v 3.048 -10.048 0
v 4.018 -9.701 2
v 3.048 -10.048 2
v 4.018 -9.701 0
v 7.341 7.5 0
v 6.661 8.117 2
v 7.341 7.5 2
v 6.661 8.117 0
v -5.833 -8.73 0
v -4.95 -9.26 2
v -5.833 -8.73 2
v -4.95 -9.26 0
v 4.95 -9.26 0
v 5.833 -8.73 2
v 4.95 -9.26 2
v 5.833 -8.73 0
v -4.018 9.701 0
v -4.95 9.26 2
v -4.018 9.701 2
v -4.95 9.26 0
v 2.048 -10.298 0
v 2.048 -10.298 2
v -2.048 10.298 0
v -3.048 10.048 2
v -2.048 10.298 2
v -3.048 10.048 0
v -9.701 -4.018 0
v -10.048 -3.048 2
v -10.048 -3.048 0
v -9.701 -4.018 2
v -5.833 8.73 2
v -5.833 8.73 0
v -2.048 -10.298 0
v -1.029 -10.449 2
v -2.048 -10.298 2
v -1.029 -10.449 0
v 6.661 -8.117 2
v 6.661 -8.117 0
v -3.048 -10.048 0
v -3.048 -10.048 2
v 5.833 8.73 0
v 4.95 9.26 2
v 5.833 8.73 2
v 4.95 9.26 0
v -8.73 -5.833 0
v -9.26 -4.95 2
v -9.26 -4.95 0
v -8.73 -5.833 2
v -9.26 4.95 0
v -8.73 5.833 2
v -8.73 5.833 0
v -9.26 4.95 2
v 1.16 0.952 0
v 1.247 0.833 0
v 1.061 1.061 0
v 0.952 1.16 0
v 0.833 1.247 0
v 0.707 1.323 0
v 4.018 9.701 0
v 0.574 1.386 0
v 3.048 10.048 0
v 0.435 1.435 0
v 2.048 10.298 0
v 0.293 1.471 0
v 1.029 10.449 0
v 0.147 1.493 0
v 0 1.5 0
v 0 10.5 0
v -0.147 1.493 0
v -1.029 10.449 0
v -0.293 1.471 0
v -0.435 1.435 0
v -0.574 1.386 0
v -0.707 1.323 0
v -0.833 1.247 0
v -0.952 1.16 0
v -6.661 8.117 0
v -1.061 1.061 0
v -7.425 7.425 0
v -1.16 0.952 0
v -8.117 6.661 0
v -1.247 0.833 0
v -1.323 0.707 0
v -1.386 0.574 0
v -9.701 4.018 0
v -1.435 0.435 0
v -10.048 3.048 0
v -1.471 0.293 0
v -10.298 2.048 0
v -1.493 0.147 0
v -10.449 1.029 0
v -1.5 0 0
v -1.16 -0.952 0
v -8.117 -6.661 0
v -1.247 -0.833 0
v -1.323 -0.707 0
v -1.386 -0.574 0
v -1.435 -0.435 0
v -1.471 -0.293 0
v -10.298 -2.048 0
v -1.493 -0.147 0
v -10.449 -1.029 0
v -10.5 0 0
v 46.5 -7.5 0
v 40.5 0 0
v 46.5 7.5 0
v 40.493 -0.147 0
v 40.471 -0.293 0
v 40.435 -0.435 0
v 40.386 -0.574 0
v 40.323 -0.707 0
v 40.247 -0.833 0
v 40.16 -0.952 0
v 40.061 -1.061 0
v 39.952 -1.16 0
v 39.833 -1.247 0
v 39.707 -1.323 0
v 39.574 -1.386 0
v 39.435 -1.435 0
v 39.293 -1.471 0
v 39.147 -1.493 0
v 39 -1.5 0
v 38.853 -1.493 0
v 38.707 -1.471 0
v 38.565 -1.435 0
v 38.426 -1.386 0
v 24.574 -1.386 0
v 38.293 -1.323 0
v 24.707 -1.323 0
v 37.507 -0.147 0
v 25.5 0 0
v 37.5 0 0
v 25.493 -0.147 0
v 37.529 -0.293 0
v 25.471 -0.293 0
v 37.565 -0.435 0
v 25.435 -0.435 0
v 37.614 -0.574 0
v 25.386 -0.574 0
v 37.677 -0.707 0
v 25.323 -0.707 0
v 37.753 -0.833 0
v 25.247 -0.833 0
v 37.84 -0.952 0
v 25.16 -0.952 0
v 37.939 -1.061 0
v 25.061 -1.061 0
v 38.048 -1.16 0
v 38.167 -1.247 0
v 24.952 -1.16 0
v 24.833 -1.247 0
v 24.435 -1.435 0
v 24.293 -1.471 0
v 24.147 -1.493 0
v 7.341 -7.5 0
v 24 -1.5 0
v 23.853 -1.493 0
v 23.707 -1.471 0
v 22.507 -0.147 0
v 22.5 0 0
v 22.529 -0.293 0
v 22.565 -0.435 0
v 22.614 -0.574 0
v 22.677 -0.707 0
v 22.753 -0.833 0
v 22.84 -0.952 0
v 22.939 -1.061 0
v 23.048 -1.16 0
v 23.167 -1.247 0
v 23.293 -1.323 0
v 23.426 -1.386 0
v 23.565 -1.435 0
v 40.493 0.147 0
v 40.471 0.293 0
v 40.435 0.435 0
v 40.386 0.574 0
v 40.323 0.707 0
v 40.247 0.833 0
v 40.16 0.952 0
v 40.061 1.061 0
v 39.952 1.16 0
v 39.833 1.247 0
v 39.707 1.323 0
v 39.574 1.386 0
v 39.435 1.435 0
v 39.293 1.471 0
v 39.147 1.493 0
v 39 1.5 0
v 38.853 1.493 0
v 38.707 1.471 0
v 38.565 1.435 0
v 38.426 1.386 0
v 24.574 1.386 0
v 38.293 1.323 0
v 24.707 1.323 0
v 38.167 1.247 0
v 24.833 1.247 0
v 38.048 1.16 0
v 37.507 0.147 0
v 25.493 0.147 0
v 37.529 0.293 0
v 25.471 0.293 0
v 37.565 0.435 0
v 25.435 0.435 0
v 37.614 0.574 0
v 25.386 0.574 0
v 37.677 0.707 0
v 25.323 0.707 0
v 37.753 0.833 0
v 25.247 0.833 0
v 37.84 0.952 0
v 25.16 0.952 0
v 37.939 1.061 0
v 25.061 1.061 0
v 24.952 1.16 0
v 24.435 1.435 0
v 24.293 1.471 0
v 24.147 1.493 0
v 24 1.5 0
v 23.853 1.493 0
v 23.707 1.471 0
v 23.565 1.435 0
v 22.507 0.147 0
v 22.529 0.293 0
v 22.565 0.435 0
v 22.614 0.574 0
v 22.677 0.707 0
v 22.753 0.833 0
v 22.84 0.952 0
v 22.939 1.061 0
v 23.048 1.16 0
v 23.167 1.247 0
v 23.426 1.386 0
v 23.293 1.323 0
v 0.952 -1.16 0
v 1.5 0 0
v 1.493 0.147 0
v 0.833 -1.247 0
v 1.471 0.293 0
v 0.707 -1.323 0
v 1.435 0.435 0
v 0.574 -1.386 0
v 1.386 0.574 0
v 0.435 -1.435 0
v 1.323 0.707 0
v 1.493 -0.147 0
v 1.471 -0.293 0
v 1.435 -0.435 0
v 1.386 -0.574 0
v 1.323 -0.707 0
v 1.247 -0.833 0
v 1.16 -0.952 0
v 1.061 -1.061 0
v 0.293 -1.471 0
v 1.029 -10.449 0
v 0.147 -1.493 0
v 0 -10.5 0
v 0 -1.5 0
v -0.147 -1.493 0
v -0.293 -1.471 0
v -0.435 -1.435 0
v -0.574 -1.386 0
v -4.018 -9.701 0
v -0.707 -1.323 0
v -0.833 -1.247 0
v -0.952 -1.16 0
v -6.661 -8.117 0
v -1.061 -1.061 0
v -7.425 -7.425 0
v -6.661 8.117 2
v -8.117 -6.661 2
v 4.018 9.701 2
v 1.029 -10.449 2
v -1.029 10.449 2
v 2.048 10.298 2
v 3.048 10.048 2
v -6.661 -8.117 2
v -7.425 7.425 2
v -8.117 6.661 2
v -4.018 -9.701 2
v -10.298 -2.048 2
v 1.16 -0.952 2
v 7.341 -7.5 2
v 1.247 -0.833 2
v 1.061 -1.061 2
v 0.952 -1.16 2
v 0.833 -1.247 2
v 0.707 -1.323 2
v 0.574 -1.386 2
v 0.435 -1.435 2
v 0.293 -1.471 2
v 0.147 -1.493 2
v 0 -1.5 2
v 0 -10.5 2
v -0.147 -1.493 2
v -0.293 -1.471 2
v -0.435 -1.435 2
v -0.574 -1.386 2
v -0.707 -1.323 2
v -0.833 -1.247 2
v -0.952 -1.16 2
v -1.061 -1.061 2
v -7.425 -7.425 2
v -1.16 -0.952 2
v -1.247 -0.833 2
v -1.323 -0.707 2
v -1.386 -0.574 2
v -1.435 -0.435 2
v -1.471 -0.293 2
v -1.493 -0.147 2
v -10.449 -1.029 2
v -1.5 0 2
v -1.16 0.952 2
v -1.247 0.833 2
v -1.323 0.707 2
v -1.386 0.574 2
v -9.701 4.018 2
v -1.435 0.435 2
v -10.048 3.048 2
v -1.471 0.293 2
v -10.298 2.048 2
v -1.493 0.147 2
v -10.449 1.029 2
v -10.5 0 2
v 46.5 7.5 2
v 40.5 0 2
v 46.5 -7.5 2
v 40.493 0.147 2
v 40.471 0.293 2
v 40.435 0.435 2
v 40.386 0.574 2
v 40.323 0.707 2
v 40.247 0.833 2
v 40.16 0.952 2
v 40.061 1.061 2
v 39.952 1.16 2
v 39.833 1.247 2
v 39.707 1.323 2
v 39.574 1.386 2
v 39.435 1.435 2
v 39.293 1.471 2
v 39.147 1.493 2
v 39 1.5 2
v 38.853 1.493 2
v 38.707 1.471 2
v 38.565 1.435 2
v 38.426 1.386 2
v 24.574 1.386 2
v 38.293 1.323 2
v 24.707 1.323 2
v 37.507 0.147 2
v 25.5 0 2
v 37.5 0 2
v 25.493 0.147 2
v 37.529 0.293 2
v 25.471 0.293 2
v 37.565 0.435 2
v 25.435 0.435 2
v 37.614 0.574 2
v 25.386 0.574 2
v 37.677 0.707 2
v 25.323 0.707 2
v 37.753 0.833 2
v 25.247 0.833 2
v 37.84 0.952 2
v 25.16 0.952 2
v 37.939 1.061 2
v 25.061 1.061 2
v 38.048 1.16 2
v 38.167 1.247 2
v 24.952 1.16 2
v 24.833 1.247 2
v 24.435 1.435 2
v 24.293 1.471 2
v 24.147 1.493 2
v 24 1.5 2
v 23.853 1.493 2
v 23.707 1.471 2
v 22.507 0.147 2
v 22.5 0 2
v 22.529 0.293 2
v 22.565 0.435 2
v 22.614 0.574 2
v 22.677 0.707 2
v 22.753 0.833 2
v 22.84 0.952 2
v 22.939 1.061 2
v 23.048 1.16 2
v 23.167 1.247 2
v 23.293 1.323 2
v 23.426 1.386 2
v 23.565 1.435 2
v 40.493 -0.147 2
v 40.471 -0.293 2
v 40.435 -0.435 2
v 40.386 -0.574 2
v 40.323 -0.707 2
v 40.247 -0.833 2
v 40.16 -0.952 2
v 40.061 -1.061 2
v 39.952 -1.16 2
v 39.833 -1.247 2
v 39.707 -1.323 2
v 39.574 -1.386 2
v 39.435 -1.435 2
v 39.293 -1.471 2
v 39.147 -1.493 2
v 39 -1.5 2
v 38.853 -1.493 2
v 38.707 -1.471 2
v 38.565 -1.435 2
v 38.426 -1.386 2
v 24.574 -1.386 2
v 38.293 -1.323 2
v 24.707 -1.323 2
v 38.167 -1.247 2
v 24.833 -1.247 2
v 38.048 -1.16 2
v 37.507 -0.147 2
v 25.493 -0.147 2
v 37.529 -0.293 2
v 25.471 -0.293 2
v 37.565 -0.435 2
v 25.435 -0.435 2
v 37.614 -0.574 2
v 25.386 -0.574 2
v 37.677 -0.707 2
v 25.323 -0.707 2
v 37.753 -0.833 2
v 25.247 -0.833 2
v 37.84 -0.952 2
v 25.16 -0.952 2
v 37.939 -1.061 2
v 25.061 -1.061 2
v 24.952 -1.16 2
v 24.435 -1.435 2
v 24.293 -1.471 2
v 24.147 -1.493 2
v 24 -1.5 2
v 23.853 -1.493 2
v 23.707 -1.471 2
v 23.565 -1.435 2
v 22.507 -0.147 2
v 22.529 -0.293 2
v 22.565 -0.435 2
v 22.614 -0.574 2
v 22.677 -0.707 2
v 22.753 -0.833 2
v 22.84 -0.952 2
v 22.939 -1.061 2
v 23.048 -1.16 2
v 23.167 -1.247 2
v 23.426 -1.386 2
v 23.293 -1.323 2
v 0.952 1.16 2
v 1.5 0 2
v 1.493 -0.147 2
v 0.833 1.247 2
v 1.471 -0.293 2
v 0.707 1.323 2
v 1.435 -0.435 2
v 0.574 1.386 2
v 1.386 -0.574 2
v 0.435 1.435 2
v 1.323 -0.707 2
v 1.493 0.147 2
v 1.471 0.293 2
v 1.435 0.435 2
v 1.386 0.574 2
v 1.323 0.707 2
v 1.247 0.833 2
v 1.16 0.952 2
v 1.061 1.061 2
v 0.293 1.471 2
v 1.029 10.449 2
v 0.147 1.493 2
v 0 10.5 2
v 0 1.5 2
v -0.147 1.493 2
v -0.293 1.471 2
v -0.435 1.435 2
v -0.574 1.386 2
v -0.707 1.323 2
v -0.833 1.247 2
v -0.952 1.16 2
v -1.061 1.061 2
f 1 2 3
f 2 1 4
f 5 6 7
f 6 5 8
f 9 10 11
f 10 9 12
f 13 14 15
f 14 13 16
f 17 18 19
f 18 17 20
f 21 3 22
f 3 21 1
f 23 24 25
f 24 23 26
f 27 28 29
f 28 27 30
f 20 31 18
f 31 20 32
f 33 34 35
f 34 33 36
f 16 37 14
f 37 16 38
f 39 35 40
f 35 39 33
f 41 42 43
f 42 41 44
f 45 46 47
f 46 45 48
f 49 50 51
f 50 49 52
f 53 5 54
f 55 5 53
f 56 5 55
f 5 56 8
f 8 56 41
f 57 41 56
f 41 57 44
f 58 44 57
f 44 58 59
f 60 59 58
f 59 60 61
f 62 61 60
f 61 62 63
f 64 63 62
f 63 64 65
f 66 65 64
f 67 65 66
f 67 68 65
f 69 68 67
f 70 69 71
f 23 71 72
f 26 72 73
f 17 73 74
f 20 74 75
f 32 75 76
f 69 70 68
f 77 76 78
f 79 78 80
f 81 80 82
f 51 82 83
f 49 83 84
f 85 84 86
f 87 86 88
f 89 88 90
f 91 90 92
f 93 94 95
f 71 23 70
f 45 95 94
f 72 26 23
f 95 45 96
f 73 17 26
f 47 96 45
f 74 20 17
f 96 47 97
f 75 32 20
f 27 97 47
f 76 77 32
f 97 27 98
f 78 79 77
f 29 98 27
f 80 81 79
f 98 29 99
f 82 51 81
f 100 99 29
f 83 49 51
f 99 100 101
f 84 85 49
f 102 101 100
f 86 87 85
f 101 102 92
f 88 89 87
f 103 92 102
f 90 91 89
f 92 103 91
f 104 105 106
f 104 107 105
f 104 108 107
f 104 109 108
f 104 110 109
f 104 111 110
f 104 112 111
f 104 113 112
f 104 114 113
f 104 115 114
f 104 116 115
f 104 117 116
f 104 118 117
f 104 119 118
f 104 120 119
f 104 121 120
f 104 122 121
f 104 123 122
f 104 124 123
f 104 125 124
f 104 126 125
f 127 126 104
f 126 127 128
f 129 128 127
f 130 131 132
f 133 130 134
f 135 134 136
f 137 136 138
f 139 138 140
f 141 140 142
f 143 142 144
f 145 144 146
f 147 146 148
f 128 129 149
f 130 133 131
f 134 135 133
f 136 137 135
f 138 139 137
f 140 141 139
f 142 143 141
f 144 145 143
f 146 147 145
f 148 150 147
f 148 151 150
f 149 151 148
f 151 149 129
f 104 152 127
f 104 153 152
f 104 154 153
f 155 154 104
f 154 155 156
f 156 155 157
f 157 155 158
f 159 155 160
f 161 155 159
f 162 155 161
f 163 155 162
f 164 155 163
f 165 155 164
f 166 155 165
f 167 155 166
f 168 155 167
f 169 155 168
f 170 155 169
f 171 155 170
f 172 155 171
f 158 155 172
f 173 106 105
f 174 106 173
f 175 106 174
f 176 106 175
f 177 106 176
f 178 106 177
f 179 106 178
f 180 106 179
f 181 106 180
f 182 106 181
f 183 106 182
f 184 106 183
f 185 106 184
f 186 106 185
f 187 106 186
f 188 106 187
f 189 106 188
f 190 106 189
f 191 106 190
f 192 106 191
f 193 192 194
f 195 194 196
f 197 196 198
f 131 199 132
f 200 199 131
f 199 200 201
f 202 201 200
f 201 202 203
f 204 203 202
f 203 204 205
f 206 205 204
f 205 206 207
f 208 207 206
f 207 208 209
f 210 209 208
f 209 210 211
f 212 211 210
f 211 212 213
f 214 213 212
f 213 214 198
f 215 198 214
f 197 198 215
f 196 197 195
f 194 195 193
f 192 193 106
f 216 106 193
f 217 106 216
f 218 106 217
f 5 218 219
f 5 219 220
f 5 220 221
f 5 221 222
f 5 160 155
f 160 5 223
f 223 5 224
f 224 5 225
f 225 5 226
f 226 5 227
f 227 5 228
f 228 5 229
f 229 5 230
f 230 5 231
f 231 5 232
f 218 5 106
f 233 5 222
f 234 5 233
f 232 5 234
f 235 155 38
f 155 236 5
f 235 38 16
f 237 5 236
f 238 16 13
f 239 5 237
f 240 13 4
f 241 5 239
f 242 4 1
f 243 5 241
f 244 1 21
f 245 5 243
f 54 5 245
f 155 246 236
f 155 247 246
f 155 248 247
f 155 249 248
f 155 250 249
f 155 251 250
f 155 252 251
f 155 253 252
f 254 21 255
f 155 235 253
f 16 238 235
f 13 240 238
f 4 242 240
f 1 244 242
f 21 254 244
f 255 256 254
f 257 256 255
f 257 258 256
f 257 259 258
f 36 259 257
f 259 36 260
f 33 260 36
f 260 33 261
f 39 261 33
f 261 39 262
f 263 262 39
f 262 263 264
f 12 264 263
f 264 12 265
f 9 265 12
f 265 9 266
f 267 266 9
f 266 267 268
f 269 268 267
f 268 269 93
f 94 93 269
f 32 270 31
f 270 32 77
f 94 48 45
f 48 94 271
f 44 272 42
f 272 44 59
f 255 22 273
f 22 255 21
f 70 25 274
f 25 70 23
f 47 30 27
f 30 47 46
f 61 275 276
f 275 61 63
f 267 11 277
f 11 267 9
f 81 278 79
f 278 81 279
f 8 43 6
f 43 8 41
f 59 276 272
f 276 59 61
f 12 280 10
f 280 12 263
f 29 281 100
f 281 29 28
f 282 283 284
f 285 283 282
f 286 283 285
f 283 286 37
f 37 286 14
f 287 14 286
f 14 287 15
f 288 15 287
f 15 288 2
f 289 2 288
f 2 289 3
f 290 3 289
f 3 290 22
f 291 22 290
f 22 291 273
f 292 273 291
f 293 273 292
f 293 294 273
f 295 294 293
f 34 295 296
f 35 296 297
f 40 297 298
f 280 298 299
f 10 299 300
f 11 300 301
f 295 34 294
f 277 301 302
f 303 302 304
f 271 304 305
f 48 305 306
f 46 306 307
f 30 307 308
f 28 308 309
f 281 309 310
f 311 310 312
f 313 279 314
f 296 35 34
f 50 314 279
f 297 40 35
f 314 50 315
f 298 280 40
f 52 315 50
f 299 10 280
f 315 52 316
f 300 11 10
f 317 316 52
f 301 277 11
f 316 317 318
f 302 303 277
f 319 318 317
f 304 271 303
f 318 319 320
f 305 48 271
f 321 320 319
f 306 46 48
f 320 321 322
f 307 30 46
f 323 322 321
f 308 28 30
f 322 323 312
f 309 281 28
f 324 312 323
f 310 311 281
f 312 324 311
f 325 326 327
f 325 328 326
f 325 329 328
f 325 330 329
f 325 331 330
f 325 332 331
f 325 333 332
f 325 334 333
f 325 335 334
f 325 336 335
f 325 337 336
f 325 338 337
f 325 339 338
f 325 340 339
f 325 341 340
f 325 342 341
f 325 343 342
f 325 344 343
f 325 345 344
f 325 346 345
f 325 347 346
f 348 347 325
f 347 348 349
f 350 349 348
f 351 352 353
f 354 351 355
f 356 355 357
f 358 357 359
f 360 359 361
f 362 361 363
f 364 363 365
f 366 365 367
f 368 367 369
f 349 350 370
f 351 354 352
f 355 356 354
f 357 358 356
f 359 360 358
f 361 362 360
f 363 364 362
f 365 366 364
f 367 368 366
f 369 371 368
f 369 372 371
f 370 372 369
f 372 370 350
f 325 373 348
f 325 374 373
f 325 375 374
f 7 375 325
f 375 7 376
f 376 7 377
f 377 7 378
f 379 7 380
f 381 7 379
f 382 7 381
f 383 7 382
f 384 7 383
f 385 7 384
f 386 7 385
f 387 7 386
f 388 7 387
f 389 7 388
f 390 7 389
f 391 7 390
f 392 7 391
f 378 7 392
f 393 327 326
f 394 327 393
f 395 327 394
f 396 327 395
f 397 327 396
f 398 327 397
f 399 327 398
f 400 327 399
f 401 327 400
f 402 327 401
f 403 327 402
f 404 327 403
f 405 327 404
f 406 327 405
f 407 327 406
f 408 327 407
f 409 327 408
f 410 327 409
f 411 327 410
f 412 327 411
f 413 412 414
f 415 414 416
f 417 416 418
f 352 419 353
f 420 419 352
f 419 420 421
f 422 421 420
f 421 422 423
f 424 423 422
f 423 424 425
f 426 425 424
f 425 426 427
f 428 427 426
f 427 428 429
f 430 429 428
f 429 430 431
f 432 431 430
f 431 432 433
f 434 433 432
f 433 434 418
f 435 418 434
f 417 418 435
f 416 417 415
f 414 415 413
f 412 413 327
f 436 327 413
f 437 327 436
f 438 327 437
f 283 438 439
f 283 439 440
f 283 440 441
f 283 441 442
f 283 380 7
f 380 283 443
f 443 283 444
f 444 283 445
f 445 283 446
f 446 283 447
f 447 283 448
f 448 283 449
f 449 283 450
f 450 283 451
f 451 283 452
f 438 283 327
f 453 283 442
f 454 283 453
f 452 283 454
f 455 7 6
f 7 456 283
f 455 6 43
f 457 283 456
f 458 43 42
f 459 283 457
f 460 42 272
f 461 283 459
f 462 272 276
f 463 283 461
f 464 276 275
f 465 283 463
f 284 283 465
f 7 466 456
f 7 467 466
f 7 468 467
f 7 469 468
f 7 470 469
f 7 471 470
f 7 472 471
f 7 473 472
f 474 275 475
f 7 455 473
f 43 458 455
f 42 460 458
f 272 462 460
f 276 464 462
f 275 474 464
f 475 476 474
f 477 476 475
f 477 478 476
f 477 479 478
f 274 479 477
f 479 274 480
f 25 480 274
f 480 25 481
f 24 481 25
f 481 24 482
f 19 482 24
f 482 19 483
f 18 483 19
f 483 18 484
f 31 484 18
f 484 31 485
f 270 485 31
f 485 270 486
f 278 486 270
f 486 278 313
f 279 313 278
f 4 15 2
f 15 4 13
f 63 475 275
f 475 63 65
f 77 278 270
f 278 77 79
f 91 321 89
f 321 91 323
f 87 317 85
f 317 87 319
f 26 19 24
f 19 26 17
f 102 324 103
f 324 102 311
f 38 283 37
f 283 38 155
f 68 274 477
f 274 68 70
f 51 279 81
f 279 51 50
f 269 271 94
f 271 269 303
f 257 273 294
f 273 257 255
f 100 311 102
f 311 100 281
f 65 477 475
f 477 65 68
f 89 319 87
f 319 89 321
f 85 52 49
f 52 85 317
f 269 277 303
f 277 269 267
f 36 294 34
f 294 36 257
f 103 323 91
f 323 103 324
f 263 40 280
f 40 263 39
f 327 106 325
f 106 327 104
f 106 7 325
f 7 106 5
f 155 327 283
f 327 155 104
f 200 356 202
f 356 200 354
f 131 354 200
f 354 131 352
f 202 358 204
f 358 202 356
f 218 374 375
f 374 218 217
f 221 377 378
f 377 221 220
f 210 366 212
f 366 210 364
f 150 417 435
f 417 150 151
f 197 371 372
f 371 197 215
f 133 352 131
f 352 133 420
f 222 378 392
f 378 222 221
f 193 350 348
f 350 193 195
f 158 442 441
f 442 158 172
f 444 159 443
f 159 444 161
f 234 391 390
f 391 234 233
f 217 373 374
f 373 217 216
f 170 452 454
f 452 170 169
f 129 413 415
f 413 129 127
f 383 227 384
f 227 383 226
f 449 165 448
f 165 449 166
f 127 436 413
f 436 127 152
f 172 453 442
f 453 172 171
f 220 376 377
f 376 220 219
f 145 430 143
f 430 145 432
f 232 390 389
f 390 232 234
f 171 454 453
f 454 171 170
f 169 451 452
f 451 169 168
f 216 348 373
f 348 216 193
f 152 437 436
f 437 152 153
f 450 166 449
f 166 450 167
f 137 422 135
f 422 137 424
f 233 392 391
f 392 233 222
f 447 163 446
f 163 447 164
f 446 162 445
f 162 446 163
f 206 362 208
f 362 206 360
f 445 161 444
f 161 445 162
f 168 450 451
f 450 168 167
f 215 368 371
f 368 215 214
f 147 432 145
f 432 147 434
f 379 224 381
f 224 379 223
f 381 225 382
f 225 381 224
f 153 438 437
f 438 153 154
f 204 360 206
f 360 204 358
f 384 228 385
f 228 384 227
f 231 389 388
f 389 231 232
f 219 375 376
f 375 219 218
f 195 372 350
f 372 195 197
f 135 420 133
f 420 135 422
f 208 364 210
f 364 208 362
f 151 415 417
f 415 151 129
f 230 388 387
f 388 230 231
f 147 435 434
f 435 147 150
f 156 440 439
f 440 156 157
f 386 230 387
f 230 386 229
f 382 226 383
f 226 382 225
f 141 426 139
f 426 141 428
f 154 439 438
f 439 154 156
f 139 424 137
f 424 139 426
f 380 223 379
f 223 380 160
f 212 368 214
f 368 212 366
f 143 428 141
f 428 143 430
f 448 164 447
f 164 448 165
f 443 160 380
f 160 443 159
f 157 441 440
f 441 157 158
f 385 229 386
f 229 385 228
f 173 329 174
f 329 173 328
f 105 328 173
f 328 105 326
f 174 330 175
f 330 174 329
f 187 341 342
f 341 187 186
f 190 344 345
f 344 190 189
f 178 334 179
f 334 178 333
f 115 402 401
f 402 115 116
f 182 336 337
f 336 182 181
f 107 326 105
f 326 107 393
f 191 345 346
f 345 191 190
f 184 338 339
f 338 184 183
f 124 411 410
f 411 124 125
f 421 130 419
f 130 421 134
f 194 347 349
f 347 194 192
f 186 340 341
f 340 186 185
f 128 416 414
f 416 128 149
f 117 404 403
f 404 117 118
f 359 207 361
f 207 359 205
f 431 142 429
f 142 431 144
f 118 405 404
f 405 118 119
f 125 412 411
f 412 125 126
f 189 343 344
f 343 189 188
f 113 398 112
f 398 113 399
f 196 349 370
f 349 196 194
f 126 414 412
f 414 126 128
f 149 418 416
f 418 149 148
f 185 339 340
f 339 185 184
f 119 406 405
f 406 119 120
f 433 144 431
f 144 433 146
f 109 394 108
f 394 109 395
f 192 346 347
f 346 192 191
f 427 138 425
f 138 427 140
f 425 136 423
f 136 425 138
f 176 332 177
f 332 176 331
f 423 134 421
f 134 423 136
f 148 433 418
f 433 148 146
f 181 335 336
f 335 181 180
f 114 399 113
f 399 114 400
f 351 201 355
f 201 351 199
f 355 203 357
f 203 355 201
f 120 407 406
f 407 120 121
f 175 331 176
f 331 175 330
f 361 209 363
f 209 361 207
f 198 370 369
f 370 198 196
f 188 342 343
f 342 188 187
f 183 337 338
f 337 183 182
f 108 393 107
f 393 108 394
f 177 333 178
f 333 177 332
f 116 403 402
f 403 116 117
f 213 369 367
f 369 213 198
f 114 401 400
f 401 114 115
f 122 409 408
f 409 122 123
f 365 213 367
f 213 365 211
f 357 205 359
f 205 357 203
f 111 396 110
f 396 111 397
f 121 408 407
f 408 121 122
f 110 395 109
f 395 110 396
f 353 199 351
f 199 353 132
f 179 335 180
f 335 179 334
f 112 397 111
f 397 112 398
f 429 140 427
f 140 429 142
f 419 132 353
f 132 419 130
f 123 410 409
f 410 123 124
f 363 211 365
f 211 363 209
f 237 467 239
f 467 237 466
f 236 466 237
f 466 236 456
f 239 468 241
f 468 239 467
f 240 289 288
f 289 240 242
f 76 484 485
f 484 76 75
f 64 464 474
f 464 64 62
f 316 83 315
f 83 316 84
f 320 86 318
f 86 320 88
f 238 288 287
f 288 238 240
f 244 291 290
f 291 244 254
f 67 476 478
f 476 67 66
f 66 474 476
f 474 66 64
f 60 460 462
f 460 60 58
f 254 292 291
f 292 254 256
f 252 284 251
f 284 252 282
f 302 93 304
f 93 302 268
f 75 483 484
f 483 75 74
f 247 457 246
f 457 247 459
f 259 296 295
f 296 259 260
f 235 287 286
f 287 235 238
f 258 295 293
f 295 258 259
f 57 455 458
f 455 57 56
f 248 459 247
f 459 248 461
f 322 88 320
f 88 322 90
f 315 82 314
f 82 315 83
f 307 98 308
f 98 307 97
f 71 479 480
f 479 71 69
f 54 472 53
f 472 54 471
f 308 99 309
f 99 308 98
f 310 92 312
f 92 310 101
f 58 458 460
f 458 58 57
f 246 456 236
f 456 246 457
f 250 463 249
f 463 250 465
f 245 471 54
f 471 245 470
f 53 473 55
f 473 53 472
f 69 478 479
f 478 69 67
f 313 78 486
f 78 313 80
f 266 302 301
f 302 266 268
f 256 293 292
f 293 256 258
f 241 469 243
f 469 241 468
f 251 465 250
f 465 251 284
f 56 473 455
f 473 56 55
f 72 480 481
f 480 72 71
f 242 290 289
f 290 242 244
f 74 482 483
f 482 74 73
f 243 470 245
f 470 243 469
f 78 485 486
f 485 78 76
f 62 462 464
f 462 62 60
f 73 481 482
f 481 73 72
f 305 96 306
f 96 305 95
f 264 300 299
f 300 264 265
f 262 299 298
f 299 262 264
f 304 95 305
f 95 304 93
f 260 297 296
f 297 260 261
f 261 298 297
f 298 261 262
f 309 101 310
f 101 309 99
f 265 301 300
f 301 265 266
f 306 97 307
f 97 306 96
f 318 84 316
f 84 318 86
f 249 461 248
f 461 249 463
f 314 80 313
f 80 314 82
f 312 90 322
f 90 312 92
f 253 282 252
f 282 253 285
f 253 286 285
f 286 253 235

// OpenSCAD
// Simple end for a Kossel brace using OpenBeam parts in an X shape
brace_circle_dia = 21; // mm
brace_circle_r = brace_circle_dia / 2;
hole_dia = 3; //mm
hole_r = hole_dia / 2;
thickness = 2;
centerhole_to_ob_edge = 16.5; // calculated from (diagonal - gap) / 2
rect_len = centerhole_to_ob_edge + 30;
ob_edge_hole_offset = 7.5;  //mm, offset from edge of OpenBeam to first hole
rect_width = 15; //mm
delta = 10; //mm

$fn=64;

difference() {
	union() {
		// Main circle
		cylinder(r=brace_circle_r, h=thickness);
		// Extension
		translate([0, -rect_width/2, 0]) cube([rect_len, rect_width, thickness]);
	}
	// Holes
	// Center hole
	cylinder(r=hole_r, h=thickness + delta * 2, center=true);
	// Holes for attaching brace to OpenBeam
	for (i = [0, 15]) {
		translate([centerhole_to_ob_edge + i + ob_edge_hole_offset, 0, 0]) cylinder(r=hole_r, h=thickness + 2 * delta, center=true);	
	}
}
